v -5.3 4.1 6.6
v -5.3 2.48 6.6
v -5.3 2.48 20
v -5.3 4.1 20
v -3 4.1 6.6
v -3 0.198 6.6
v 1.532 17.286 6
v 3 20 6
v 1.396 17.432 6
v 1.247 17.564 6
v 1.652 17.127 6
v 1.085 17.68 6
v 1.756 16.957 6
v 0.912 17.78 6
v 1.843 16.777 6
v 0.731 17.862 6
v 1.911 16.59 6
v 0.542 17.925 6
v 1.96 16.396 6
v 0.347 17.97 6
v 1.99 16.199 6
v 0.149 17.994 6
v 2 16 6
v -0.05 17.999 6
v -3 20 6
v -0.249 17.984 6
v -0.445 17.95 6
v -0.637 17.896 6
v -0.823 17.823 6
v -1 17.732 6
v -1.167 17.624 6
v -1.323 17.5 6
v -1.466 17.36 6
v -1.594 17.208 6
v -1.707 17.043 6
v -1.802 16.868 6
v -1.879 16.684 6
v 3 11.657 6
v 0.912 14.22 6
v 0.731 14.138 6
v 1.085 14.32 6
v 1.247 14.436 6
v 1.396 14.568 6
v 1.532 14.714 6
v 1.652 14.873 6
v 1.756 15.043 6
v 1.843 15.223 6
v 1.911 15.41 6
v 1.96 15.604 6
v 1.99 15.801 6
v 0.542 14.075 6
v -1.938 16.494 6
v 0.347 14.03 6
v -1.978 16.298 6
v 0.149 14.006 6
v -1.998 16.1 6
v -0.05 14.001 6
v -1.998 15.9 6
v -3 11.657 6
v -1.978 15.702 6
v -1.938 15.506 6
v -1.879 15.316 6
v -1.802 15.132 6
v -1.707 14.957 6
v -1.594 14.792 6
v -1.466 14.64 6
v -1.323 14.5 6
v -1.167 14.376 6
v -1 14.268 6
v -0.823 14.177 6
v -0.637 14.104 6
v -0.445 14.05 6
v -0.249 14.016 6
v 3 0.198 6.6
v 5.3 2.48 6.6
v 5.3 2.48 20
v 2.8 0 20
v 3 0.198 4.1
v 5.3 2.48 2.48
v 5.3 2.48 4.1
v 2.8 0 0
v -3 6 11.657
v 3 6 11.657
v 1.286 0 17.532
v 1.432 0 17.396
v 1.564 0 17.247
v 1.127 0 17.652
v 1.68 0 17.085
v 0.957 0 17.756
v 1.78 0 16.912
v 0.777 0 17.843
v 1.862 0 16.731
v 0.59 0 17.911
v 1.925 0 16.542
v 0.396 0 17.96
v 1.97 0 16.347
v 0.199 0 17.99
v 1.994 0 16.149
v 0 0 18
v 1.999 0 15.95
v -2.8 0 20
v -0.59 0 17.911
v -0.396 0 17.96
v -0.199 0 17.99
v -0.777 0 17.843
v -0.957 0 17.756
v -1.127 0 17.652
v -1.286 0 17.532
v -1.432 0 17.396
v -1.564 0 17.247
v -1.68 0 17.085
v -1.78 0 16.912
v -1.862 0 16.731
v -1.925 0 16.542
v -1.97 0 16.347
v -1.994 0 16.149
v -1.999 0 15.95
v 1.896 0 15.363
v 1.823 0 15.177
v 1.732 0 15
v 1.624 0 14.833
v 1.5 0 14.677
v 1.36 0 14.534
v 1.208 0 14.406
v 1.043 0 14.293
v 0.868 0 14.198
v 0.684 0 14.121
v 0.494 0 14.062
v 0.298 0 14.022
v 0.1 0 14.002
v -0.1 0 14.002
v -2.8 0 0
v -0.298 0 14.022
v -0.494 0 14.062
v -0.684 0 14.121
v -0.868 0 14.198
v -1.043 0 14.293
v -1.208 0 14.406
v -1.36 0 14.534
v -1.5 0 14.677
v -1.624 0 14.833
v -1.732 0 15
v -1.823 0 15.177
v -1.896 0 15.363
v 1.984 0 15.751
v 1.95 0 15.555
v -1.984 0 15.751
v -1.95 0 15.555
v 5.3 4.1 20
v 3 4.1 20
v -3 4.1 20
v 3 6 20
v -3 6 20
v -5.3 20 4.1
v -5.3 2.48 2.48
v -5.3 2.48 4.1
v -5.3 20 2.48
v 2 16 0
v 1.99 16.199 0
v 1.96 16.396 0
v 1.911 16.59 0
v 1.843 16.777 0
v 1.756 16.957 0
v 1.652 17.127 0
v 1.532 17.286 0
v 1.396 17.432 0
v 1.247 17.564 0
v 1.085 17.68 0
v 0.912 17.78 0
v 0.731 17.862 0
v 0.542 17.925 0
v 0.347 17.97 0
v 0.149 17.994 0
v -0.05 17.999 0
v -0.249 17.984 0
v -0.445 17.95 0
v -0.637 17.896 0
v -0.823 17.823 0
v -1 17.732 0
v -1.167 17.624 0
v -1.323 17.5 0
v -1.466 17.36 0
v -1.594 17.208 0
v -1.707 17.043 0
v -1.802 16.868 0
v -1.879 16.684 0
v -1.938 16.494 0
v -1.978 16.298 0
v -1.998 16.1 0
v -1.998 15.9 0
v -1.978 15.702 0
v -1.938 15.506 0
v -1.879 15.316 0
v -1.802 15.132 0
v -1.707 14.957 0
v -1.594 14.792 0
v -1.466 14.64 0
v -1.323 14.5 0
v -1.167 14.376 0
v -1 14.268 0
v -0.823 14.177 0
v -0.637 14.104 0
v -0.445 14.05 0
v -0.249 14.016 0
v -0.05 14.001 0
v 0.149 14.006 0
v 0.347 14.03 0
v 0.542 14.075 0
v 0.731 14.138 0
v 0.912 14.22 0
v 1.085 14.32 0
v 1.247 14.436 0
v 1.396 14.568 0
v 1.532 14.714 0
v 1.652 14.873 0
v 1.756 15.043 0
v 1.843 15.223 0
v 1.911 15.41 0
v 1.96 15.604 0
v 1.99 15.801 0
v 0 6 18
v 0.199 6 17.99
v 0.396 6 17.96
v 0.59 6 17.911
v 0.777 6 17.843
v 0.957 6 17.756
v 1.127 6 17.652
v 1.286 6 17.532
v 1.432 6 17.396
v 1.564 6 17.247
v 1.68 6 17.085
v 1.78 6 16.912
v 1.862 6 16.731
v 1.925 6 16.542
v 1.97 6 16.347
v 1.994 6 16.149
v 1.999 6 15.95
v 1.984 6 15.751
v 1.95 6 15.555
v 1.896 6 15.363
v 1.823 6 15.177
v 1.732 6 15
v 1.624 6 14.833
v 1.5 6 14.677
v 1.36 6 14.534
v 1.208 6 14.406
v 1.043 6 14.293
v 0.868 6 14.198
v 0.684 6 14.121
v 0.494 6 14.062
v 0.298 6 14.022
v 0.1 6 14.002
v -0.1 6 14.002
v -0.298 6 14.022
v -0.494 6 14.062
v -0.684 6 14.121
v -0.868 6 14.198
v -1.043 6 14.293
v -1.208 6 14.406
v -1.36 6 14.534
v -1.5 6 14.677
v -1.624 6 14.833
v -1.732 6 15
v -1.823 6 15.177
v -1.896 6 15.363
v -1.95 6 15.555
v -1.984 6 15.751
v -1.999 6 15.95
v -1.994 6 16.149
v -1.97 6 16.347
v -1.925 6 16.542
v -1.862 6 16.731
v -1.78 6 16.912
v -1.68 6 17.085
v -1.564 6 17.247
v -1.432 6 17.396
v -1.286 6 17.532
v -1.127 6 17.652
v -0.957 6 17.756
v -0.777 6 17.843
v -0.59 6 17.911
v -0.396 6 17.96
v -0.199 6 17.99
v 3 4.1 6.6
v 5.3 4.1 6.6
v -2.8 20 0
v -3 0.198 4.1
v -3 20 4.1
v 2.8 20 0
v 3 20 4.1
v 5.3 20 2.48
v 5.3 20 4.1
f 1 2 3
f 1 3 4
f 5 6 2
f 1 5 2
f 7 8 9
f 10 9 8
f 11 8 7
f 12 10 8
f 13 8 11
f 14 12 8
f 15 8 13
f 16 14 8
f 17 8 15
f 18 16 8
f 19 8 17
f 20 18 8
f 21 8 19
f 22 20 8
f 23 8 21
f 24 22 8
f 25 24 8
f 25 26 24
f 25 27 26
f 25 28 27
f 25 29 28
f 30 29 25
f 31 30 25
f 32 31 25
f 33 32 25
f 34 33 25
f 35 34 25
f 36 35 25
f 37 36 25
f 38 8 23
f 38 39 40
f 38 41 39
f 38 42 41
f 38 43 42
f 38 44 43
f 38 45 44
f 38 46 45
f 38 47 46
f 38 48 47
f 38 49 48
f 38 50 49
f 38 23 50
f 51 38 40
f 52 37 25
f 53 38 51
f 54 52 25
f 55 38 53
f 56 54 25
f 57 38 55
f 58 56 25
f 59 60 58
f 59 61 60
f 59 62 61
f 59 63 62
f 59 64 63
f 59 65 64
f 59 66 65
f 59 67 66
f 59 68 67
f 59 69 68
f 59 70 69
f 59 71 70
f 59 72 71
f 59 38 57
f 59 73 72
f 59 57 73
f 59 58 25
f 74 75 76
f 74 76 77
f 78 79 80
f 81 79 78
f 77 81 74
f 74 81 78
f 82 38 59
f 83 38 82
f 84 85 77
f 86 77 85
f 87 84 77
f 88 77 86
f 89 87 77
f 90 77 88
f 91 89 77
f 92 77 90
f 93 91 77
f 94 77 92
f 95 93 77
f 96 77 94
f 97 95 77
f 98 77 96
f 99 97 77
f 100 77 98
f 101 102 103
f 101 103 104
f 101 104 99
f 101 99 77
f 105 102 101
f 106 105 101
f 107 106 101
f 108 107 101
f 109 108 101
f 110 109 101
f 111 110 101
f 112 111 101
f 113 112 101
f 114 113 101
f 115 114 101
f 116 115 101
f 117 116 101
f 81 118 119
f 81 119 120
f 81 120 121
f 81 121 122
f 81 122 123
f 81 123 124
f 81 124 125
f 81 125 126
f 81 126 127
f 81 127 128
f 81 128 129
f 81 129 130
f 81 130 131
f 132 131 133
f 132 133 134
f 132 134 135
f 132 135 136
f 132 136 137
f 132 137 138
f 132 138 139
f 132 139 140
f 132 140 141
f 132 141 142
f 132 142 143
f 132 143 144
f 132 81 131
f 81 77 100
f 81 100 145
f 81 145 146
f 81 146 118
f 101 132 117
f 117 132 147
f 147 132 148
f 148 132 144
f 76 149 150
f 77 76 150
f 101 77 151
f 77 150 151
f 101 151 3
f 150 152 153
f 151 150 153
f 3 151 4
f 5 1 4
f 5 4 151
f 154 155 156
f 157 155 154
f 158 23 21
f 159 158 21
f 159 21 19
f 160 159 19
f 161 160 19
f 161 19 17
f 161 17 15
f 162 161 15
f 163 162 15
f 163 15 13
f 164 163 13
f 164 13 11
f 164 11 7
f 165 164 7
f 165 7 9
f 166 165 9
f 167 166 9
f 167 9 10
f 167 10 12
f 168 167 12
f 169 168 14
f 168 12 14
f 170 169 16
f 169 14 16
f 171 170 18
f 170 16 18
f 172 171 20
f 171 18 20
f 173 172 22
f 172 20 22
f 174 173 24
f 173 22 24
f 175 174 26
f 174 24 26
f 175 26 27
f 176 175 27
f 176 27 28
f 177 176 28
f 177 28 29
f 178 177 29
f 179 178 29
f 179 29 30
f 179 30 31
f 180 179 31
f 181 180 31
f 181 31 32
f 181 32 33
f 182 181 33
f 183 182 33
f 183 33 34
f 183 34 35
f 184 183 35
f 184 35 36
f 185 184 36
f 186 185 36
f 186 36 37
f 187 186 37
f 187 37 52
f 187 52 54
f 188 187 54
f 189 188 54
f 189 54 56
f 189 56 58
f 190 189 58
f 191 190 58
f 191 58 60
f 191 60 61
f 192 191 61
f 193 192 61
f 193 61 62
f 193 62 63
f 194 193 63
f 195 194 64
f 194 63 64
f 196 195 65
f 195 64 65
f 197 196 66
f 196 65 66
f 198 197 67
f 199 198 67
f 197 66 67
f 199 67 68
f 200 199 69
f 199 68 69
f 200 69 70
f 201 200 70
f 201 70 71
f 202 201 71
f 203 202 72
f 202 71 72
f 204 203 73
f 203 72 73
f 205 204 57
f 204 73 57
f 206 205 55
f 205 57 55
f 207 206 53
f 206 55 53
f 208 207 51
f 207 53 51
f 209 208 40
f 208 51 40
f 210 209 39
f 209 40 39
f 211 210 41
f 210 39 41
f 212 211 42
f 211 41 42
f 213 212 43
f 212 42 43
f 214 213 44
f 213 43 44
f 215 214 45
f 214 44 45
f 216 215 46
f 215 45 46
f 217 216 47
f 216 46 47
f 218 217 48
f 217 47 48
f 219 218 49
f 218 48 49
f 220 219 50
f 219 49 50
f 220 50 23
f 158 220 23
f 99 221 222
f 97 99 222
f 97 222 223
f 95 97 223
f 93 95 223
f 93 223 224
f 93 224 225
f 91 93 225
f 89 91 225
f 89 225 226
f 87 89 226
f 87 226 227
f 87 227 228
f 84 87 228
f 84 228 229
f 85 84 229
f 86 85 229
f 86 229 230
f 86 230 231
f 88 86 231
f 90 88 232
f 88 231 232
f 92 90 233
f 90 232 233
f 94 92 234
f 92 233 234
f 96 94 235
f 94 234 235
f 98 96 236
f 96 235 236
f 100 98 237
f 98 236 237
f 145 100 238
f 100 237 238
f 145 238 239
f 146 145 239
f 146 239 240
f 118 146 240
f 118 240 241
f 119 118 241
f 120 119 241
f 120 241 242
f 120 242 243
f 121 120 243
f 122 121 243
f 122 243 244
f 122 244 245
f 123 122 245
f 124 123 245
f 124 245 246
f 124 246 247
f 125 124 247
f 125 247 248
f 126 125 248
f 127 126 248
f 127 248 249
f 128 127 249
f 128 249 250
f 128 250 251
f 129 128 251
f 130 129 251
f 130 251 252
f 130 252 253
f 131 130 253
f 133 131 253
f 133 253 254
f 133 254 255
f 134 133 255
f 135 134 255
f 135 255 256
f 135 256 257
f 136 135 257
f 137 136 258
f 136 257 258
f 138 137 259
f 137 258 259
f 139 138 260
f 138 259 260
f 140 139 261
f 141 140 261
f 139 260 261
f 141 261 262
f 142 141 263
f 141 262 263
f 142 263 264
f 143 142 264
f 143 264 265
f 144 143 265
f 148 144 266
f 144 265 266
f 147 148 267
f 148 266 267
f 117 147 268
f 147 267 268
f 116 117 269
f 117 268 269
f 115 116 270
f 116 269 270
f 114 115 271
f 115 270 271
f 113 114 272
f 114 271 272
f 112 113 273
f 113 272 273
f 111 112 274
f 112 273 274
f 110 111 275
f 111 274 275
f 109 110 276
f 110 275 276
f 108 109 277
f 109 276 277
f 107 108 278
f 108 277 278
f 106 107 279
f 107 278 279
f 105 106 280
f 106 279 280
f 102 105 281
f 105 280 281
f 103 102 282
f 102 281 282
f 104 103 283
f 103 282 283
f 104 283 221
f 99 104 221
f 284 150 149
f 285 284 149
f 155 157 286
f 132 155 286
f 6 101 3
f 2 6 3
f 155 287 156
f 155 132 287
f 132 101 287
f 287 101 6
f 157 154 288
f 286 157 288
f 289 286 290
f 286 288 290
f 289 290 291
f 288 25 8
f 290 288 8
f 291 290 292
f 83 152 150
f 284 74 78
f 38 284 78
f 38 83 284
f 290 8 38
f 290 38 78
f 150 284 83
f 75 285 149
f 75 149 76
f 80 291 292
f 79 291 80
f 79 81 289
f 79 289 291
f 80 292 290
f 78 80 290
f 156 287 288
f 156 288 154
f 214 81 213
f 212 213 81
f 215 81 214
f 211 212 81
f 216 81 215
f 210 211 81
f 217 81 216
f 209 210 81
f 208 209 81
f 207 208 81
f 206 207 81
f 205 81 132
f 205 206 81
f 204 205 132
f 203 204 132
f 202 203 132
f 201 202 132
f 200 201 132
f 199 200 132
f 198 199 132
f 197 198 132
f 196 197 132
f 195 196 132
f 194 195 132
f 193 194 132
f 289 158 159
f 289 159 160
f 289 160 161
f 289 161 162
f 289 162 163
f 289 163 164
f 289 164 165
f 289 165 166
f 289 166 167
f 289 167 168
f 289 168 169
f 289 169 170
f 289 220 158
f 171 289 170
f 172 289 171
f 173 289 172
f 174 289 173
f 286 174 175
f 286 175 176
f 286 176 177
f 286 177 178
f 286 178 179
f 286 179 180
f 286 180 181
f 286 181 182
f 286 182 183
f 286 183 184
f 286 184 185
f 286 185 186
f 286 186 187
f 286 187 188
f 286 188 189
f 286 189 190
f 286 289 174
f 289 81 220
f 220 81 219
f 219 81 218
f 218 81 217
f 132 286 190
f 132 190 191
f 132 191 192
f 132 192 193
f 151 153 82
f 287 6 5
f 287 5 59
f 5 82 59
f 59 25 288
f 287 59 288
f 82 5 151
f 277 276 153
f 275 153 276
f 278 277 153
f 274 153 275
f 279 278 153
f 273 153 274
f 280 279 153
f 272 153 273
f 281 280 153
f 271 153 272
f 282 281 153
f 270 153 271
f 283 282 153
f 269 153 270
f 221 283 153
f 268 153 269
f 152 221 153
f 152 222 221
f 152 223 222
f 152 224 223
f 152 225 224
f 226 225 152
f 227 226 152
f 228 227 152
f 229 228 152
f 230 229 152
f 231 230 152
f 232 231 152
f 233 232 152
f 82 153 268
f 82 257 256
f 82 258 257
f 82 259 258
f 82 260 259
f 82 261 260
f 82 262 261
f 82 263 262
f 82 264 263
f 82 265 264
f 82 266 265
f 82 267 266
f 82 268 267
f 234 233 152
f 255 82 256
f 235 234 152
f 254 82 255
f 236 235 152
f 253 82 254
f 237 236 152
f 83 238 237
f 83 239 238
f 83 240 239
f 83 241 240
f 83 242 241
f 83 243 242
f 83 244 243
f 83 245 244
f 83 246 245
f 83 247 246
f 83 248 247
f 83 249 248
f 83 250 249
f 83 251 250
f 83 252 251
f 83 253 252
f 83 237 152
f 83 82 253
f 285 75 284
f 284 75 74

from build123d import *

# Parameters (mm, degrees)
BOSS_EXTRUDE1_DEPTH     = 20
BOSS_EXTRUDE2_DEPTH     = 20
CUT_EXTRUDE3_DEPTH      = 29.776552955
CUT_EXTRUDE3_DEPTH_BACK = 29.776552955
CUT_EXTRUDE4_DEPTH      = 29.776552955
BOSS_EXTRUDE3_DEPTH     = 3
CUT_EXTRUDE5_DEPTH      = 29.776552955
SKETCH11_R              = 2
CUT_EXTRUDE6_DEPTH      = 25.98179337
SKETCH12_R              = 2
CUT_EXTRUDE7_DEPTH      = 10


with BuildPart() as part:
    # Sketch1 → Boss-Extrude1 (new body)
    with BuildSketch(Plane.XY):
        Polygon((-3, 6), (3, 6), (3, 4.1), (5.3, 4.1), (5.3, 2.48), (2.8, 0), (-2.8, 0), (-5.3, 2.48), (-5.3, 4.1), (-3, 4.1), align=None)
    extrude(amount=BOSS_EXTRUDE1_DEPTH)

    # Sketch2 → Boss-Extrude2 (add)
    with BuildSketch(Plane(origin=(-0.009718496, 0, -0.066979448), x_dir=(-1, 0, 0), z_dir=(0, 1, 0))):
        Polygon((-3.009718496, 6.066979448), (2.990281504, 6.066979448), (2.990281504, 4.166979448), (5.290281504, 4.166979448), (5.290281504, 2.546979448), (2.790281504, 0.066979448), (-2.809718496, 0.066979448), (-5.309718496, 2.546979448), (-5.309718496, 4.166979448), (-3.009718496, 4.166979448), align=None)
    extrude(amount=BOSS_EXTRUDE2_DEPTH)

    # Sketch3 → Cut-Extrude3 (cut, two sides: drawn at the far end of the back side and taken through both)
    with BuildSketch(Plane(origin=(0, 0, 0), x_dir=(1, 0, 0), z_dir=(0, 1, 0)).offset(-CUT_EXTRUDE3_DEPTH_BACK)):
        Polygon((-2.8, 0), (-5.3, -2.48), (-5.3, 0), align=None)
        Polygon((5.3, -2.48), (5.3, 0), (2.8, 0), align=None)
    extrude(amount=CUT_EXTRUDE3_DEPTH + CUT_EXTRUDE3_DEPTH_BACK, mode=Mode.SUBTRACT)

    # Sketch4 → Cut-Extrude4 (cut, through all)
    with BuildSketch(Plane.XY):
        Polygon((2.8, 0), (3, 0), (5.3, 0), (5.3, 2.48), align=None)
        Polygon((-5.3, 2.48), (-5.3, 0), (-3, 0), (-2.8, 0), align=None)
    extrude(amount=CUT_EXTRUDE4_DEPTH, mode=Mode.SUBTRACT)

    # Sketch5 → Boss-Extrude3 (add, symmetric)
    with BuildSketch(Plane(origin=(0, 0, 0), x_dir=(0, 0, -1), z_dir=(1, 0, 0))):
        Polygon((-11.656854249, 6), (-6, 6), (-6, 11.656854249), align=None)
    extrude(amount=BOSS_EXTRUDE3_DEPTH, both=True)

    # Sketch10 → Cut-Extrude5 (cut, through all)
    with BuildSketch(Plane(origin=(0, 0, 0), x_dir=(1, 0, 0), z_dir=(0, 1, 0))):
        Polygon((-5.3, -4.1), (-3, -4.1), (-3, -6), (-3, -6.6), (-5.3, -6.6), align=None)
        Polygon((3, -6), (3, -4.1), (5.3, -4.1), (5.3, -6.6), (3, -6.6), align=None)
    extrude(amount=CUT_EXTRUDE5_DEPTH, mode=Mode.SUBTRACT)

    # Sketch11 → Cut-Extrude6 (cut, through all)
    with BuildSketch(Plane.XY.offset(6)):
        with Locations((0, 16)):
            Circle(SKETCH11_R)
    extrude(amount=-CUT_EXTRUDE6_DEPTH, mode=Mode.SUBTRACT)

    # Sketch12 → Cut-Extrude7 (cut)
    with BuildSketch(Plane(origin=(0, 6, 0), x_dir=(1, 0, 0), z_dir=(0, 1, 0))):
        with Locations(Location((0, -16, 0), (0, 0, 270))):
            Circle(SKETCH12_R)
    extrude(amount=-CUT_EXTRUDE7_DEPTH, mode=Mode.SUBTRACT)


solid = part.part
